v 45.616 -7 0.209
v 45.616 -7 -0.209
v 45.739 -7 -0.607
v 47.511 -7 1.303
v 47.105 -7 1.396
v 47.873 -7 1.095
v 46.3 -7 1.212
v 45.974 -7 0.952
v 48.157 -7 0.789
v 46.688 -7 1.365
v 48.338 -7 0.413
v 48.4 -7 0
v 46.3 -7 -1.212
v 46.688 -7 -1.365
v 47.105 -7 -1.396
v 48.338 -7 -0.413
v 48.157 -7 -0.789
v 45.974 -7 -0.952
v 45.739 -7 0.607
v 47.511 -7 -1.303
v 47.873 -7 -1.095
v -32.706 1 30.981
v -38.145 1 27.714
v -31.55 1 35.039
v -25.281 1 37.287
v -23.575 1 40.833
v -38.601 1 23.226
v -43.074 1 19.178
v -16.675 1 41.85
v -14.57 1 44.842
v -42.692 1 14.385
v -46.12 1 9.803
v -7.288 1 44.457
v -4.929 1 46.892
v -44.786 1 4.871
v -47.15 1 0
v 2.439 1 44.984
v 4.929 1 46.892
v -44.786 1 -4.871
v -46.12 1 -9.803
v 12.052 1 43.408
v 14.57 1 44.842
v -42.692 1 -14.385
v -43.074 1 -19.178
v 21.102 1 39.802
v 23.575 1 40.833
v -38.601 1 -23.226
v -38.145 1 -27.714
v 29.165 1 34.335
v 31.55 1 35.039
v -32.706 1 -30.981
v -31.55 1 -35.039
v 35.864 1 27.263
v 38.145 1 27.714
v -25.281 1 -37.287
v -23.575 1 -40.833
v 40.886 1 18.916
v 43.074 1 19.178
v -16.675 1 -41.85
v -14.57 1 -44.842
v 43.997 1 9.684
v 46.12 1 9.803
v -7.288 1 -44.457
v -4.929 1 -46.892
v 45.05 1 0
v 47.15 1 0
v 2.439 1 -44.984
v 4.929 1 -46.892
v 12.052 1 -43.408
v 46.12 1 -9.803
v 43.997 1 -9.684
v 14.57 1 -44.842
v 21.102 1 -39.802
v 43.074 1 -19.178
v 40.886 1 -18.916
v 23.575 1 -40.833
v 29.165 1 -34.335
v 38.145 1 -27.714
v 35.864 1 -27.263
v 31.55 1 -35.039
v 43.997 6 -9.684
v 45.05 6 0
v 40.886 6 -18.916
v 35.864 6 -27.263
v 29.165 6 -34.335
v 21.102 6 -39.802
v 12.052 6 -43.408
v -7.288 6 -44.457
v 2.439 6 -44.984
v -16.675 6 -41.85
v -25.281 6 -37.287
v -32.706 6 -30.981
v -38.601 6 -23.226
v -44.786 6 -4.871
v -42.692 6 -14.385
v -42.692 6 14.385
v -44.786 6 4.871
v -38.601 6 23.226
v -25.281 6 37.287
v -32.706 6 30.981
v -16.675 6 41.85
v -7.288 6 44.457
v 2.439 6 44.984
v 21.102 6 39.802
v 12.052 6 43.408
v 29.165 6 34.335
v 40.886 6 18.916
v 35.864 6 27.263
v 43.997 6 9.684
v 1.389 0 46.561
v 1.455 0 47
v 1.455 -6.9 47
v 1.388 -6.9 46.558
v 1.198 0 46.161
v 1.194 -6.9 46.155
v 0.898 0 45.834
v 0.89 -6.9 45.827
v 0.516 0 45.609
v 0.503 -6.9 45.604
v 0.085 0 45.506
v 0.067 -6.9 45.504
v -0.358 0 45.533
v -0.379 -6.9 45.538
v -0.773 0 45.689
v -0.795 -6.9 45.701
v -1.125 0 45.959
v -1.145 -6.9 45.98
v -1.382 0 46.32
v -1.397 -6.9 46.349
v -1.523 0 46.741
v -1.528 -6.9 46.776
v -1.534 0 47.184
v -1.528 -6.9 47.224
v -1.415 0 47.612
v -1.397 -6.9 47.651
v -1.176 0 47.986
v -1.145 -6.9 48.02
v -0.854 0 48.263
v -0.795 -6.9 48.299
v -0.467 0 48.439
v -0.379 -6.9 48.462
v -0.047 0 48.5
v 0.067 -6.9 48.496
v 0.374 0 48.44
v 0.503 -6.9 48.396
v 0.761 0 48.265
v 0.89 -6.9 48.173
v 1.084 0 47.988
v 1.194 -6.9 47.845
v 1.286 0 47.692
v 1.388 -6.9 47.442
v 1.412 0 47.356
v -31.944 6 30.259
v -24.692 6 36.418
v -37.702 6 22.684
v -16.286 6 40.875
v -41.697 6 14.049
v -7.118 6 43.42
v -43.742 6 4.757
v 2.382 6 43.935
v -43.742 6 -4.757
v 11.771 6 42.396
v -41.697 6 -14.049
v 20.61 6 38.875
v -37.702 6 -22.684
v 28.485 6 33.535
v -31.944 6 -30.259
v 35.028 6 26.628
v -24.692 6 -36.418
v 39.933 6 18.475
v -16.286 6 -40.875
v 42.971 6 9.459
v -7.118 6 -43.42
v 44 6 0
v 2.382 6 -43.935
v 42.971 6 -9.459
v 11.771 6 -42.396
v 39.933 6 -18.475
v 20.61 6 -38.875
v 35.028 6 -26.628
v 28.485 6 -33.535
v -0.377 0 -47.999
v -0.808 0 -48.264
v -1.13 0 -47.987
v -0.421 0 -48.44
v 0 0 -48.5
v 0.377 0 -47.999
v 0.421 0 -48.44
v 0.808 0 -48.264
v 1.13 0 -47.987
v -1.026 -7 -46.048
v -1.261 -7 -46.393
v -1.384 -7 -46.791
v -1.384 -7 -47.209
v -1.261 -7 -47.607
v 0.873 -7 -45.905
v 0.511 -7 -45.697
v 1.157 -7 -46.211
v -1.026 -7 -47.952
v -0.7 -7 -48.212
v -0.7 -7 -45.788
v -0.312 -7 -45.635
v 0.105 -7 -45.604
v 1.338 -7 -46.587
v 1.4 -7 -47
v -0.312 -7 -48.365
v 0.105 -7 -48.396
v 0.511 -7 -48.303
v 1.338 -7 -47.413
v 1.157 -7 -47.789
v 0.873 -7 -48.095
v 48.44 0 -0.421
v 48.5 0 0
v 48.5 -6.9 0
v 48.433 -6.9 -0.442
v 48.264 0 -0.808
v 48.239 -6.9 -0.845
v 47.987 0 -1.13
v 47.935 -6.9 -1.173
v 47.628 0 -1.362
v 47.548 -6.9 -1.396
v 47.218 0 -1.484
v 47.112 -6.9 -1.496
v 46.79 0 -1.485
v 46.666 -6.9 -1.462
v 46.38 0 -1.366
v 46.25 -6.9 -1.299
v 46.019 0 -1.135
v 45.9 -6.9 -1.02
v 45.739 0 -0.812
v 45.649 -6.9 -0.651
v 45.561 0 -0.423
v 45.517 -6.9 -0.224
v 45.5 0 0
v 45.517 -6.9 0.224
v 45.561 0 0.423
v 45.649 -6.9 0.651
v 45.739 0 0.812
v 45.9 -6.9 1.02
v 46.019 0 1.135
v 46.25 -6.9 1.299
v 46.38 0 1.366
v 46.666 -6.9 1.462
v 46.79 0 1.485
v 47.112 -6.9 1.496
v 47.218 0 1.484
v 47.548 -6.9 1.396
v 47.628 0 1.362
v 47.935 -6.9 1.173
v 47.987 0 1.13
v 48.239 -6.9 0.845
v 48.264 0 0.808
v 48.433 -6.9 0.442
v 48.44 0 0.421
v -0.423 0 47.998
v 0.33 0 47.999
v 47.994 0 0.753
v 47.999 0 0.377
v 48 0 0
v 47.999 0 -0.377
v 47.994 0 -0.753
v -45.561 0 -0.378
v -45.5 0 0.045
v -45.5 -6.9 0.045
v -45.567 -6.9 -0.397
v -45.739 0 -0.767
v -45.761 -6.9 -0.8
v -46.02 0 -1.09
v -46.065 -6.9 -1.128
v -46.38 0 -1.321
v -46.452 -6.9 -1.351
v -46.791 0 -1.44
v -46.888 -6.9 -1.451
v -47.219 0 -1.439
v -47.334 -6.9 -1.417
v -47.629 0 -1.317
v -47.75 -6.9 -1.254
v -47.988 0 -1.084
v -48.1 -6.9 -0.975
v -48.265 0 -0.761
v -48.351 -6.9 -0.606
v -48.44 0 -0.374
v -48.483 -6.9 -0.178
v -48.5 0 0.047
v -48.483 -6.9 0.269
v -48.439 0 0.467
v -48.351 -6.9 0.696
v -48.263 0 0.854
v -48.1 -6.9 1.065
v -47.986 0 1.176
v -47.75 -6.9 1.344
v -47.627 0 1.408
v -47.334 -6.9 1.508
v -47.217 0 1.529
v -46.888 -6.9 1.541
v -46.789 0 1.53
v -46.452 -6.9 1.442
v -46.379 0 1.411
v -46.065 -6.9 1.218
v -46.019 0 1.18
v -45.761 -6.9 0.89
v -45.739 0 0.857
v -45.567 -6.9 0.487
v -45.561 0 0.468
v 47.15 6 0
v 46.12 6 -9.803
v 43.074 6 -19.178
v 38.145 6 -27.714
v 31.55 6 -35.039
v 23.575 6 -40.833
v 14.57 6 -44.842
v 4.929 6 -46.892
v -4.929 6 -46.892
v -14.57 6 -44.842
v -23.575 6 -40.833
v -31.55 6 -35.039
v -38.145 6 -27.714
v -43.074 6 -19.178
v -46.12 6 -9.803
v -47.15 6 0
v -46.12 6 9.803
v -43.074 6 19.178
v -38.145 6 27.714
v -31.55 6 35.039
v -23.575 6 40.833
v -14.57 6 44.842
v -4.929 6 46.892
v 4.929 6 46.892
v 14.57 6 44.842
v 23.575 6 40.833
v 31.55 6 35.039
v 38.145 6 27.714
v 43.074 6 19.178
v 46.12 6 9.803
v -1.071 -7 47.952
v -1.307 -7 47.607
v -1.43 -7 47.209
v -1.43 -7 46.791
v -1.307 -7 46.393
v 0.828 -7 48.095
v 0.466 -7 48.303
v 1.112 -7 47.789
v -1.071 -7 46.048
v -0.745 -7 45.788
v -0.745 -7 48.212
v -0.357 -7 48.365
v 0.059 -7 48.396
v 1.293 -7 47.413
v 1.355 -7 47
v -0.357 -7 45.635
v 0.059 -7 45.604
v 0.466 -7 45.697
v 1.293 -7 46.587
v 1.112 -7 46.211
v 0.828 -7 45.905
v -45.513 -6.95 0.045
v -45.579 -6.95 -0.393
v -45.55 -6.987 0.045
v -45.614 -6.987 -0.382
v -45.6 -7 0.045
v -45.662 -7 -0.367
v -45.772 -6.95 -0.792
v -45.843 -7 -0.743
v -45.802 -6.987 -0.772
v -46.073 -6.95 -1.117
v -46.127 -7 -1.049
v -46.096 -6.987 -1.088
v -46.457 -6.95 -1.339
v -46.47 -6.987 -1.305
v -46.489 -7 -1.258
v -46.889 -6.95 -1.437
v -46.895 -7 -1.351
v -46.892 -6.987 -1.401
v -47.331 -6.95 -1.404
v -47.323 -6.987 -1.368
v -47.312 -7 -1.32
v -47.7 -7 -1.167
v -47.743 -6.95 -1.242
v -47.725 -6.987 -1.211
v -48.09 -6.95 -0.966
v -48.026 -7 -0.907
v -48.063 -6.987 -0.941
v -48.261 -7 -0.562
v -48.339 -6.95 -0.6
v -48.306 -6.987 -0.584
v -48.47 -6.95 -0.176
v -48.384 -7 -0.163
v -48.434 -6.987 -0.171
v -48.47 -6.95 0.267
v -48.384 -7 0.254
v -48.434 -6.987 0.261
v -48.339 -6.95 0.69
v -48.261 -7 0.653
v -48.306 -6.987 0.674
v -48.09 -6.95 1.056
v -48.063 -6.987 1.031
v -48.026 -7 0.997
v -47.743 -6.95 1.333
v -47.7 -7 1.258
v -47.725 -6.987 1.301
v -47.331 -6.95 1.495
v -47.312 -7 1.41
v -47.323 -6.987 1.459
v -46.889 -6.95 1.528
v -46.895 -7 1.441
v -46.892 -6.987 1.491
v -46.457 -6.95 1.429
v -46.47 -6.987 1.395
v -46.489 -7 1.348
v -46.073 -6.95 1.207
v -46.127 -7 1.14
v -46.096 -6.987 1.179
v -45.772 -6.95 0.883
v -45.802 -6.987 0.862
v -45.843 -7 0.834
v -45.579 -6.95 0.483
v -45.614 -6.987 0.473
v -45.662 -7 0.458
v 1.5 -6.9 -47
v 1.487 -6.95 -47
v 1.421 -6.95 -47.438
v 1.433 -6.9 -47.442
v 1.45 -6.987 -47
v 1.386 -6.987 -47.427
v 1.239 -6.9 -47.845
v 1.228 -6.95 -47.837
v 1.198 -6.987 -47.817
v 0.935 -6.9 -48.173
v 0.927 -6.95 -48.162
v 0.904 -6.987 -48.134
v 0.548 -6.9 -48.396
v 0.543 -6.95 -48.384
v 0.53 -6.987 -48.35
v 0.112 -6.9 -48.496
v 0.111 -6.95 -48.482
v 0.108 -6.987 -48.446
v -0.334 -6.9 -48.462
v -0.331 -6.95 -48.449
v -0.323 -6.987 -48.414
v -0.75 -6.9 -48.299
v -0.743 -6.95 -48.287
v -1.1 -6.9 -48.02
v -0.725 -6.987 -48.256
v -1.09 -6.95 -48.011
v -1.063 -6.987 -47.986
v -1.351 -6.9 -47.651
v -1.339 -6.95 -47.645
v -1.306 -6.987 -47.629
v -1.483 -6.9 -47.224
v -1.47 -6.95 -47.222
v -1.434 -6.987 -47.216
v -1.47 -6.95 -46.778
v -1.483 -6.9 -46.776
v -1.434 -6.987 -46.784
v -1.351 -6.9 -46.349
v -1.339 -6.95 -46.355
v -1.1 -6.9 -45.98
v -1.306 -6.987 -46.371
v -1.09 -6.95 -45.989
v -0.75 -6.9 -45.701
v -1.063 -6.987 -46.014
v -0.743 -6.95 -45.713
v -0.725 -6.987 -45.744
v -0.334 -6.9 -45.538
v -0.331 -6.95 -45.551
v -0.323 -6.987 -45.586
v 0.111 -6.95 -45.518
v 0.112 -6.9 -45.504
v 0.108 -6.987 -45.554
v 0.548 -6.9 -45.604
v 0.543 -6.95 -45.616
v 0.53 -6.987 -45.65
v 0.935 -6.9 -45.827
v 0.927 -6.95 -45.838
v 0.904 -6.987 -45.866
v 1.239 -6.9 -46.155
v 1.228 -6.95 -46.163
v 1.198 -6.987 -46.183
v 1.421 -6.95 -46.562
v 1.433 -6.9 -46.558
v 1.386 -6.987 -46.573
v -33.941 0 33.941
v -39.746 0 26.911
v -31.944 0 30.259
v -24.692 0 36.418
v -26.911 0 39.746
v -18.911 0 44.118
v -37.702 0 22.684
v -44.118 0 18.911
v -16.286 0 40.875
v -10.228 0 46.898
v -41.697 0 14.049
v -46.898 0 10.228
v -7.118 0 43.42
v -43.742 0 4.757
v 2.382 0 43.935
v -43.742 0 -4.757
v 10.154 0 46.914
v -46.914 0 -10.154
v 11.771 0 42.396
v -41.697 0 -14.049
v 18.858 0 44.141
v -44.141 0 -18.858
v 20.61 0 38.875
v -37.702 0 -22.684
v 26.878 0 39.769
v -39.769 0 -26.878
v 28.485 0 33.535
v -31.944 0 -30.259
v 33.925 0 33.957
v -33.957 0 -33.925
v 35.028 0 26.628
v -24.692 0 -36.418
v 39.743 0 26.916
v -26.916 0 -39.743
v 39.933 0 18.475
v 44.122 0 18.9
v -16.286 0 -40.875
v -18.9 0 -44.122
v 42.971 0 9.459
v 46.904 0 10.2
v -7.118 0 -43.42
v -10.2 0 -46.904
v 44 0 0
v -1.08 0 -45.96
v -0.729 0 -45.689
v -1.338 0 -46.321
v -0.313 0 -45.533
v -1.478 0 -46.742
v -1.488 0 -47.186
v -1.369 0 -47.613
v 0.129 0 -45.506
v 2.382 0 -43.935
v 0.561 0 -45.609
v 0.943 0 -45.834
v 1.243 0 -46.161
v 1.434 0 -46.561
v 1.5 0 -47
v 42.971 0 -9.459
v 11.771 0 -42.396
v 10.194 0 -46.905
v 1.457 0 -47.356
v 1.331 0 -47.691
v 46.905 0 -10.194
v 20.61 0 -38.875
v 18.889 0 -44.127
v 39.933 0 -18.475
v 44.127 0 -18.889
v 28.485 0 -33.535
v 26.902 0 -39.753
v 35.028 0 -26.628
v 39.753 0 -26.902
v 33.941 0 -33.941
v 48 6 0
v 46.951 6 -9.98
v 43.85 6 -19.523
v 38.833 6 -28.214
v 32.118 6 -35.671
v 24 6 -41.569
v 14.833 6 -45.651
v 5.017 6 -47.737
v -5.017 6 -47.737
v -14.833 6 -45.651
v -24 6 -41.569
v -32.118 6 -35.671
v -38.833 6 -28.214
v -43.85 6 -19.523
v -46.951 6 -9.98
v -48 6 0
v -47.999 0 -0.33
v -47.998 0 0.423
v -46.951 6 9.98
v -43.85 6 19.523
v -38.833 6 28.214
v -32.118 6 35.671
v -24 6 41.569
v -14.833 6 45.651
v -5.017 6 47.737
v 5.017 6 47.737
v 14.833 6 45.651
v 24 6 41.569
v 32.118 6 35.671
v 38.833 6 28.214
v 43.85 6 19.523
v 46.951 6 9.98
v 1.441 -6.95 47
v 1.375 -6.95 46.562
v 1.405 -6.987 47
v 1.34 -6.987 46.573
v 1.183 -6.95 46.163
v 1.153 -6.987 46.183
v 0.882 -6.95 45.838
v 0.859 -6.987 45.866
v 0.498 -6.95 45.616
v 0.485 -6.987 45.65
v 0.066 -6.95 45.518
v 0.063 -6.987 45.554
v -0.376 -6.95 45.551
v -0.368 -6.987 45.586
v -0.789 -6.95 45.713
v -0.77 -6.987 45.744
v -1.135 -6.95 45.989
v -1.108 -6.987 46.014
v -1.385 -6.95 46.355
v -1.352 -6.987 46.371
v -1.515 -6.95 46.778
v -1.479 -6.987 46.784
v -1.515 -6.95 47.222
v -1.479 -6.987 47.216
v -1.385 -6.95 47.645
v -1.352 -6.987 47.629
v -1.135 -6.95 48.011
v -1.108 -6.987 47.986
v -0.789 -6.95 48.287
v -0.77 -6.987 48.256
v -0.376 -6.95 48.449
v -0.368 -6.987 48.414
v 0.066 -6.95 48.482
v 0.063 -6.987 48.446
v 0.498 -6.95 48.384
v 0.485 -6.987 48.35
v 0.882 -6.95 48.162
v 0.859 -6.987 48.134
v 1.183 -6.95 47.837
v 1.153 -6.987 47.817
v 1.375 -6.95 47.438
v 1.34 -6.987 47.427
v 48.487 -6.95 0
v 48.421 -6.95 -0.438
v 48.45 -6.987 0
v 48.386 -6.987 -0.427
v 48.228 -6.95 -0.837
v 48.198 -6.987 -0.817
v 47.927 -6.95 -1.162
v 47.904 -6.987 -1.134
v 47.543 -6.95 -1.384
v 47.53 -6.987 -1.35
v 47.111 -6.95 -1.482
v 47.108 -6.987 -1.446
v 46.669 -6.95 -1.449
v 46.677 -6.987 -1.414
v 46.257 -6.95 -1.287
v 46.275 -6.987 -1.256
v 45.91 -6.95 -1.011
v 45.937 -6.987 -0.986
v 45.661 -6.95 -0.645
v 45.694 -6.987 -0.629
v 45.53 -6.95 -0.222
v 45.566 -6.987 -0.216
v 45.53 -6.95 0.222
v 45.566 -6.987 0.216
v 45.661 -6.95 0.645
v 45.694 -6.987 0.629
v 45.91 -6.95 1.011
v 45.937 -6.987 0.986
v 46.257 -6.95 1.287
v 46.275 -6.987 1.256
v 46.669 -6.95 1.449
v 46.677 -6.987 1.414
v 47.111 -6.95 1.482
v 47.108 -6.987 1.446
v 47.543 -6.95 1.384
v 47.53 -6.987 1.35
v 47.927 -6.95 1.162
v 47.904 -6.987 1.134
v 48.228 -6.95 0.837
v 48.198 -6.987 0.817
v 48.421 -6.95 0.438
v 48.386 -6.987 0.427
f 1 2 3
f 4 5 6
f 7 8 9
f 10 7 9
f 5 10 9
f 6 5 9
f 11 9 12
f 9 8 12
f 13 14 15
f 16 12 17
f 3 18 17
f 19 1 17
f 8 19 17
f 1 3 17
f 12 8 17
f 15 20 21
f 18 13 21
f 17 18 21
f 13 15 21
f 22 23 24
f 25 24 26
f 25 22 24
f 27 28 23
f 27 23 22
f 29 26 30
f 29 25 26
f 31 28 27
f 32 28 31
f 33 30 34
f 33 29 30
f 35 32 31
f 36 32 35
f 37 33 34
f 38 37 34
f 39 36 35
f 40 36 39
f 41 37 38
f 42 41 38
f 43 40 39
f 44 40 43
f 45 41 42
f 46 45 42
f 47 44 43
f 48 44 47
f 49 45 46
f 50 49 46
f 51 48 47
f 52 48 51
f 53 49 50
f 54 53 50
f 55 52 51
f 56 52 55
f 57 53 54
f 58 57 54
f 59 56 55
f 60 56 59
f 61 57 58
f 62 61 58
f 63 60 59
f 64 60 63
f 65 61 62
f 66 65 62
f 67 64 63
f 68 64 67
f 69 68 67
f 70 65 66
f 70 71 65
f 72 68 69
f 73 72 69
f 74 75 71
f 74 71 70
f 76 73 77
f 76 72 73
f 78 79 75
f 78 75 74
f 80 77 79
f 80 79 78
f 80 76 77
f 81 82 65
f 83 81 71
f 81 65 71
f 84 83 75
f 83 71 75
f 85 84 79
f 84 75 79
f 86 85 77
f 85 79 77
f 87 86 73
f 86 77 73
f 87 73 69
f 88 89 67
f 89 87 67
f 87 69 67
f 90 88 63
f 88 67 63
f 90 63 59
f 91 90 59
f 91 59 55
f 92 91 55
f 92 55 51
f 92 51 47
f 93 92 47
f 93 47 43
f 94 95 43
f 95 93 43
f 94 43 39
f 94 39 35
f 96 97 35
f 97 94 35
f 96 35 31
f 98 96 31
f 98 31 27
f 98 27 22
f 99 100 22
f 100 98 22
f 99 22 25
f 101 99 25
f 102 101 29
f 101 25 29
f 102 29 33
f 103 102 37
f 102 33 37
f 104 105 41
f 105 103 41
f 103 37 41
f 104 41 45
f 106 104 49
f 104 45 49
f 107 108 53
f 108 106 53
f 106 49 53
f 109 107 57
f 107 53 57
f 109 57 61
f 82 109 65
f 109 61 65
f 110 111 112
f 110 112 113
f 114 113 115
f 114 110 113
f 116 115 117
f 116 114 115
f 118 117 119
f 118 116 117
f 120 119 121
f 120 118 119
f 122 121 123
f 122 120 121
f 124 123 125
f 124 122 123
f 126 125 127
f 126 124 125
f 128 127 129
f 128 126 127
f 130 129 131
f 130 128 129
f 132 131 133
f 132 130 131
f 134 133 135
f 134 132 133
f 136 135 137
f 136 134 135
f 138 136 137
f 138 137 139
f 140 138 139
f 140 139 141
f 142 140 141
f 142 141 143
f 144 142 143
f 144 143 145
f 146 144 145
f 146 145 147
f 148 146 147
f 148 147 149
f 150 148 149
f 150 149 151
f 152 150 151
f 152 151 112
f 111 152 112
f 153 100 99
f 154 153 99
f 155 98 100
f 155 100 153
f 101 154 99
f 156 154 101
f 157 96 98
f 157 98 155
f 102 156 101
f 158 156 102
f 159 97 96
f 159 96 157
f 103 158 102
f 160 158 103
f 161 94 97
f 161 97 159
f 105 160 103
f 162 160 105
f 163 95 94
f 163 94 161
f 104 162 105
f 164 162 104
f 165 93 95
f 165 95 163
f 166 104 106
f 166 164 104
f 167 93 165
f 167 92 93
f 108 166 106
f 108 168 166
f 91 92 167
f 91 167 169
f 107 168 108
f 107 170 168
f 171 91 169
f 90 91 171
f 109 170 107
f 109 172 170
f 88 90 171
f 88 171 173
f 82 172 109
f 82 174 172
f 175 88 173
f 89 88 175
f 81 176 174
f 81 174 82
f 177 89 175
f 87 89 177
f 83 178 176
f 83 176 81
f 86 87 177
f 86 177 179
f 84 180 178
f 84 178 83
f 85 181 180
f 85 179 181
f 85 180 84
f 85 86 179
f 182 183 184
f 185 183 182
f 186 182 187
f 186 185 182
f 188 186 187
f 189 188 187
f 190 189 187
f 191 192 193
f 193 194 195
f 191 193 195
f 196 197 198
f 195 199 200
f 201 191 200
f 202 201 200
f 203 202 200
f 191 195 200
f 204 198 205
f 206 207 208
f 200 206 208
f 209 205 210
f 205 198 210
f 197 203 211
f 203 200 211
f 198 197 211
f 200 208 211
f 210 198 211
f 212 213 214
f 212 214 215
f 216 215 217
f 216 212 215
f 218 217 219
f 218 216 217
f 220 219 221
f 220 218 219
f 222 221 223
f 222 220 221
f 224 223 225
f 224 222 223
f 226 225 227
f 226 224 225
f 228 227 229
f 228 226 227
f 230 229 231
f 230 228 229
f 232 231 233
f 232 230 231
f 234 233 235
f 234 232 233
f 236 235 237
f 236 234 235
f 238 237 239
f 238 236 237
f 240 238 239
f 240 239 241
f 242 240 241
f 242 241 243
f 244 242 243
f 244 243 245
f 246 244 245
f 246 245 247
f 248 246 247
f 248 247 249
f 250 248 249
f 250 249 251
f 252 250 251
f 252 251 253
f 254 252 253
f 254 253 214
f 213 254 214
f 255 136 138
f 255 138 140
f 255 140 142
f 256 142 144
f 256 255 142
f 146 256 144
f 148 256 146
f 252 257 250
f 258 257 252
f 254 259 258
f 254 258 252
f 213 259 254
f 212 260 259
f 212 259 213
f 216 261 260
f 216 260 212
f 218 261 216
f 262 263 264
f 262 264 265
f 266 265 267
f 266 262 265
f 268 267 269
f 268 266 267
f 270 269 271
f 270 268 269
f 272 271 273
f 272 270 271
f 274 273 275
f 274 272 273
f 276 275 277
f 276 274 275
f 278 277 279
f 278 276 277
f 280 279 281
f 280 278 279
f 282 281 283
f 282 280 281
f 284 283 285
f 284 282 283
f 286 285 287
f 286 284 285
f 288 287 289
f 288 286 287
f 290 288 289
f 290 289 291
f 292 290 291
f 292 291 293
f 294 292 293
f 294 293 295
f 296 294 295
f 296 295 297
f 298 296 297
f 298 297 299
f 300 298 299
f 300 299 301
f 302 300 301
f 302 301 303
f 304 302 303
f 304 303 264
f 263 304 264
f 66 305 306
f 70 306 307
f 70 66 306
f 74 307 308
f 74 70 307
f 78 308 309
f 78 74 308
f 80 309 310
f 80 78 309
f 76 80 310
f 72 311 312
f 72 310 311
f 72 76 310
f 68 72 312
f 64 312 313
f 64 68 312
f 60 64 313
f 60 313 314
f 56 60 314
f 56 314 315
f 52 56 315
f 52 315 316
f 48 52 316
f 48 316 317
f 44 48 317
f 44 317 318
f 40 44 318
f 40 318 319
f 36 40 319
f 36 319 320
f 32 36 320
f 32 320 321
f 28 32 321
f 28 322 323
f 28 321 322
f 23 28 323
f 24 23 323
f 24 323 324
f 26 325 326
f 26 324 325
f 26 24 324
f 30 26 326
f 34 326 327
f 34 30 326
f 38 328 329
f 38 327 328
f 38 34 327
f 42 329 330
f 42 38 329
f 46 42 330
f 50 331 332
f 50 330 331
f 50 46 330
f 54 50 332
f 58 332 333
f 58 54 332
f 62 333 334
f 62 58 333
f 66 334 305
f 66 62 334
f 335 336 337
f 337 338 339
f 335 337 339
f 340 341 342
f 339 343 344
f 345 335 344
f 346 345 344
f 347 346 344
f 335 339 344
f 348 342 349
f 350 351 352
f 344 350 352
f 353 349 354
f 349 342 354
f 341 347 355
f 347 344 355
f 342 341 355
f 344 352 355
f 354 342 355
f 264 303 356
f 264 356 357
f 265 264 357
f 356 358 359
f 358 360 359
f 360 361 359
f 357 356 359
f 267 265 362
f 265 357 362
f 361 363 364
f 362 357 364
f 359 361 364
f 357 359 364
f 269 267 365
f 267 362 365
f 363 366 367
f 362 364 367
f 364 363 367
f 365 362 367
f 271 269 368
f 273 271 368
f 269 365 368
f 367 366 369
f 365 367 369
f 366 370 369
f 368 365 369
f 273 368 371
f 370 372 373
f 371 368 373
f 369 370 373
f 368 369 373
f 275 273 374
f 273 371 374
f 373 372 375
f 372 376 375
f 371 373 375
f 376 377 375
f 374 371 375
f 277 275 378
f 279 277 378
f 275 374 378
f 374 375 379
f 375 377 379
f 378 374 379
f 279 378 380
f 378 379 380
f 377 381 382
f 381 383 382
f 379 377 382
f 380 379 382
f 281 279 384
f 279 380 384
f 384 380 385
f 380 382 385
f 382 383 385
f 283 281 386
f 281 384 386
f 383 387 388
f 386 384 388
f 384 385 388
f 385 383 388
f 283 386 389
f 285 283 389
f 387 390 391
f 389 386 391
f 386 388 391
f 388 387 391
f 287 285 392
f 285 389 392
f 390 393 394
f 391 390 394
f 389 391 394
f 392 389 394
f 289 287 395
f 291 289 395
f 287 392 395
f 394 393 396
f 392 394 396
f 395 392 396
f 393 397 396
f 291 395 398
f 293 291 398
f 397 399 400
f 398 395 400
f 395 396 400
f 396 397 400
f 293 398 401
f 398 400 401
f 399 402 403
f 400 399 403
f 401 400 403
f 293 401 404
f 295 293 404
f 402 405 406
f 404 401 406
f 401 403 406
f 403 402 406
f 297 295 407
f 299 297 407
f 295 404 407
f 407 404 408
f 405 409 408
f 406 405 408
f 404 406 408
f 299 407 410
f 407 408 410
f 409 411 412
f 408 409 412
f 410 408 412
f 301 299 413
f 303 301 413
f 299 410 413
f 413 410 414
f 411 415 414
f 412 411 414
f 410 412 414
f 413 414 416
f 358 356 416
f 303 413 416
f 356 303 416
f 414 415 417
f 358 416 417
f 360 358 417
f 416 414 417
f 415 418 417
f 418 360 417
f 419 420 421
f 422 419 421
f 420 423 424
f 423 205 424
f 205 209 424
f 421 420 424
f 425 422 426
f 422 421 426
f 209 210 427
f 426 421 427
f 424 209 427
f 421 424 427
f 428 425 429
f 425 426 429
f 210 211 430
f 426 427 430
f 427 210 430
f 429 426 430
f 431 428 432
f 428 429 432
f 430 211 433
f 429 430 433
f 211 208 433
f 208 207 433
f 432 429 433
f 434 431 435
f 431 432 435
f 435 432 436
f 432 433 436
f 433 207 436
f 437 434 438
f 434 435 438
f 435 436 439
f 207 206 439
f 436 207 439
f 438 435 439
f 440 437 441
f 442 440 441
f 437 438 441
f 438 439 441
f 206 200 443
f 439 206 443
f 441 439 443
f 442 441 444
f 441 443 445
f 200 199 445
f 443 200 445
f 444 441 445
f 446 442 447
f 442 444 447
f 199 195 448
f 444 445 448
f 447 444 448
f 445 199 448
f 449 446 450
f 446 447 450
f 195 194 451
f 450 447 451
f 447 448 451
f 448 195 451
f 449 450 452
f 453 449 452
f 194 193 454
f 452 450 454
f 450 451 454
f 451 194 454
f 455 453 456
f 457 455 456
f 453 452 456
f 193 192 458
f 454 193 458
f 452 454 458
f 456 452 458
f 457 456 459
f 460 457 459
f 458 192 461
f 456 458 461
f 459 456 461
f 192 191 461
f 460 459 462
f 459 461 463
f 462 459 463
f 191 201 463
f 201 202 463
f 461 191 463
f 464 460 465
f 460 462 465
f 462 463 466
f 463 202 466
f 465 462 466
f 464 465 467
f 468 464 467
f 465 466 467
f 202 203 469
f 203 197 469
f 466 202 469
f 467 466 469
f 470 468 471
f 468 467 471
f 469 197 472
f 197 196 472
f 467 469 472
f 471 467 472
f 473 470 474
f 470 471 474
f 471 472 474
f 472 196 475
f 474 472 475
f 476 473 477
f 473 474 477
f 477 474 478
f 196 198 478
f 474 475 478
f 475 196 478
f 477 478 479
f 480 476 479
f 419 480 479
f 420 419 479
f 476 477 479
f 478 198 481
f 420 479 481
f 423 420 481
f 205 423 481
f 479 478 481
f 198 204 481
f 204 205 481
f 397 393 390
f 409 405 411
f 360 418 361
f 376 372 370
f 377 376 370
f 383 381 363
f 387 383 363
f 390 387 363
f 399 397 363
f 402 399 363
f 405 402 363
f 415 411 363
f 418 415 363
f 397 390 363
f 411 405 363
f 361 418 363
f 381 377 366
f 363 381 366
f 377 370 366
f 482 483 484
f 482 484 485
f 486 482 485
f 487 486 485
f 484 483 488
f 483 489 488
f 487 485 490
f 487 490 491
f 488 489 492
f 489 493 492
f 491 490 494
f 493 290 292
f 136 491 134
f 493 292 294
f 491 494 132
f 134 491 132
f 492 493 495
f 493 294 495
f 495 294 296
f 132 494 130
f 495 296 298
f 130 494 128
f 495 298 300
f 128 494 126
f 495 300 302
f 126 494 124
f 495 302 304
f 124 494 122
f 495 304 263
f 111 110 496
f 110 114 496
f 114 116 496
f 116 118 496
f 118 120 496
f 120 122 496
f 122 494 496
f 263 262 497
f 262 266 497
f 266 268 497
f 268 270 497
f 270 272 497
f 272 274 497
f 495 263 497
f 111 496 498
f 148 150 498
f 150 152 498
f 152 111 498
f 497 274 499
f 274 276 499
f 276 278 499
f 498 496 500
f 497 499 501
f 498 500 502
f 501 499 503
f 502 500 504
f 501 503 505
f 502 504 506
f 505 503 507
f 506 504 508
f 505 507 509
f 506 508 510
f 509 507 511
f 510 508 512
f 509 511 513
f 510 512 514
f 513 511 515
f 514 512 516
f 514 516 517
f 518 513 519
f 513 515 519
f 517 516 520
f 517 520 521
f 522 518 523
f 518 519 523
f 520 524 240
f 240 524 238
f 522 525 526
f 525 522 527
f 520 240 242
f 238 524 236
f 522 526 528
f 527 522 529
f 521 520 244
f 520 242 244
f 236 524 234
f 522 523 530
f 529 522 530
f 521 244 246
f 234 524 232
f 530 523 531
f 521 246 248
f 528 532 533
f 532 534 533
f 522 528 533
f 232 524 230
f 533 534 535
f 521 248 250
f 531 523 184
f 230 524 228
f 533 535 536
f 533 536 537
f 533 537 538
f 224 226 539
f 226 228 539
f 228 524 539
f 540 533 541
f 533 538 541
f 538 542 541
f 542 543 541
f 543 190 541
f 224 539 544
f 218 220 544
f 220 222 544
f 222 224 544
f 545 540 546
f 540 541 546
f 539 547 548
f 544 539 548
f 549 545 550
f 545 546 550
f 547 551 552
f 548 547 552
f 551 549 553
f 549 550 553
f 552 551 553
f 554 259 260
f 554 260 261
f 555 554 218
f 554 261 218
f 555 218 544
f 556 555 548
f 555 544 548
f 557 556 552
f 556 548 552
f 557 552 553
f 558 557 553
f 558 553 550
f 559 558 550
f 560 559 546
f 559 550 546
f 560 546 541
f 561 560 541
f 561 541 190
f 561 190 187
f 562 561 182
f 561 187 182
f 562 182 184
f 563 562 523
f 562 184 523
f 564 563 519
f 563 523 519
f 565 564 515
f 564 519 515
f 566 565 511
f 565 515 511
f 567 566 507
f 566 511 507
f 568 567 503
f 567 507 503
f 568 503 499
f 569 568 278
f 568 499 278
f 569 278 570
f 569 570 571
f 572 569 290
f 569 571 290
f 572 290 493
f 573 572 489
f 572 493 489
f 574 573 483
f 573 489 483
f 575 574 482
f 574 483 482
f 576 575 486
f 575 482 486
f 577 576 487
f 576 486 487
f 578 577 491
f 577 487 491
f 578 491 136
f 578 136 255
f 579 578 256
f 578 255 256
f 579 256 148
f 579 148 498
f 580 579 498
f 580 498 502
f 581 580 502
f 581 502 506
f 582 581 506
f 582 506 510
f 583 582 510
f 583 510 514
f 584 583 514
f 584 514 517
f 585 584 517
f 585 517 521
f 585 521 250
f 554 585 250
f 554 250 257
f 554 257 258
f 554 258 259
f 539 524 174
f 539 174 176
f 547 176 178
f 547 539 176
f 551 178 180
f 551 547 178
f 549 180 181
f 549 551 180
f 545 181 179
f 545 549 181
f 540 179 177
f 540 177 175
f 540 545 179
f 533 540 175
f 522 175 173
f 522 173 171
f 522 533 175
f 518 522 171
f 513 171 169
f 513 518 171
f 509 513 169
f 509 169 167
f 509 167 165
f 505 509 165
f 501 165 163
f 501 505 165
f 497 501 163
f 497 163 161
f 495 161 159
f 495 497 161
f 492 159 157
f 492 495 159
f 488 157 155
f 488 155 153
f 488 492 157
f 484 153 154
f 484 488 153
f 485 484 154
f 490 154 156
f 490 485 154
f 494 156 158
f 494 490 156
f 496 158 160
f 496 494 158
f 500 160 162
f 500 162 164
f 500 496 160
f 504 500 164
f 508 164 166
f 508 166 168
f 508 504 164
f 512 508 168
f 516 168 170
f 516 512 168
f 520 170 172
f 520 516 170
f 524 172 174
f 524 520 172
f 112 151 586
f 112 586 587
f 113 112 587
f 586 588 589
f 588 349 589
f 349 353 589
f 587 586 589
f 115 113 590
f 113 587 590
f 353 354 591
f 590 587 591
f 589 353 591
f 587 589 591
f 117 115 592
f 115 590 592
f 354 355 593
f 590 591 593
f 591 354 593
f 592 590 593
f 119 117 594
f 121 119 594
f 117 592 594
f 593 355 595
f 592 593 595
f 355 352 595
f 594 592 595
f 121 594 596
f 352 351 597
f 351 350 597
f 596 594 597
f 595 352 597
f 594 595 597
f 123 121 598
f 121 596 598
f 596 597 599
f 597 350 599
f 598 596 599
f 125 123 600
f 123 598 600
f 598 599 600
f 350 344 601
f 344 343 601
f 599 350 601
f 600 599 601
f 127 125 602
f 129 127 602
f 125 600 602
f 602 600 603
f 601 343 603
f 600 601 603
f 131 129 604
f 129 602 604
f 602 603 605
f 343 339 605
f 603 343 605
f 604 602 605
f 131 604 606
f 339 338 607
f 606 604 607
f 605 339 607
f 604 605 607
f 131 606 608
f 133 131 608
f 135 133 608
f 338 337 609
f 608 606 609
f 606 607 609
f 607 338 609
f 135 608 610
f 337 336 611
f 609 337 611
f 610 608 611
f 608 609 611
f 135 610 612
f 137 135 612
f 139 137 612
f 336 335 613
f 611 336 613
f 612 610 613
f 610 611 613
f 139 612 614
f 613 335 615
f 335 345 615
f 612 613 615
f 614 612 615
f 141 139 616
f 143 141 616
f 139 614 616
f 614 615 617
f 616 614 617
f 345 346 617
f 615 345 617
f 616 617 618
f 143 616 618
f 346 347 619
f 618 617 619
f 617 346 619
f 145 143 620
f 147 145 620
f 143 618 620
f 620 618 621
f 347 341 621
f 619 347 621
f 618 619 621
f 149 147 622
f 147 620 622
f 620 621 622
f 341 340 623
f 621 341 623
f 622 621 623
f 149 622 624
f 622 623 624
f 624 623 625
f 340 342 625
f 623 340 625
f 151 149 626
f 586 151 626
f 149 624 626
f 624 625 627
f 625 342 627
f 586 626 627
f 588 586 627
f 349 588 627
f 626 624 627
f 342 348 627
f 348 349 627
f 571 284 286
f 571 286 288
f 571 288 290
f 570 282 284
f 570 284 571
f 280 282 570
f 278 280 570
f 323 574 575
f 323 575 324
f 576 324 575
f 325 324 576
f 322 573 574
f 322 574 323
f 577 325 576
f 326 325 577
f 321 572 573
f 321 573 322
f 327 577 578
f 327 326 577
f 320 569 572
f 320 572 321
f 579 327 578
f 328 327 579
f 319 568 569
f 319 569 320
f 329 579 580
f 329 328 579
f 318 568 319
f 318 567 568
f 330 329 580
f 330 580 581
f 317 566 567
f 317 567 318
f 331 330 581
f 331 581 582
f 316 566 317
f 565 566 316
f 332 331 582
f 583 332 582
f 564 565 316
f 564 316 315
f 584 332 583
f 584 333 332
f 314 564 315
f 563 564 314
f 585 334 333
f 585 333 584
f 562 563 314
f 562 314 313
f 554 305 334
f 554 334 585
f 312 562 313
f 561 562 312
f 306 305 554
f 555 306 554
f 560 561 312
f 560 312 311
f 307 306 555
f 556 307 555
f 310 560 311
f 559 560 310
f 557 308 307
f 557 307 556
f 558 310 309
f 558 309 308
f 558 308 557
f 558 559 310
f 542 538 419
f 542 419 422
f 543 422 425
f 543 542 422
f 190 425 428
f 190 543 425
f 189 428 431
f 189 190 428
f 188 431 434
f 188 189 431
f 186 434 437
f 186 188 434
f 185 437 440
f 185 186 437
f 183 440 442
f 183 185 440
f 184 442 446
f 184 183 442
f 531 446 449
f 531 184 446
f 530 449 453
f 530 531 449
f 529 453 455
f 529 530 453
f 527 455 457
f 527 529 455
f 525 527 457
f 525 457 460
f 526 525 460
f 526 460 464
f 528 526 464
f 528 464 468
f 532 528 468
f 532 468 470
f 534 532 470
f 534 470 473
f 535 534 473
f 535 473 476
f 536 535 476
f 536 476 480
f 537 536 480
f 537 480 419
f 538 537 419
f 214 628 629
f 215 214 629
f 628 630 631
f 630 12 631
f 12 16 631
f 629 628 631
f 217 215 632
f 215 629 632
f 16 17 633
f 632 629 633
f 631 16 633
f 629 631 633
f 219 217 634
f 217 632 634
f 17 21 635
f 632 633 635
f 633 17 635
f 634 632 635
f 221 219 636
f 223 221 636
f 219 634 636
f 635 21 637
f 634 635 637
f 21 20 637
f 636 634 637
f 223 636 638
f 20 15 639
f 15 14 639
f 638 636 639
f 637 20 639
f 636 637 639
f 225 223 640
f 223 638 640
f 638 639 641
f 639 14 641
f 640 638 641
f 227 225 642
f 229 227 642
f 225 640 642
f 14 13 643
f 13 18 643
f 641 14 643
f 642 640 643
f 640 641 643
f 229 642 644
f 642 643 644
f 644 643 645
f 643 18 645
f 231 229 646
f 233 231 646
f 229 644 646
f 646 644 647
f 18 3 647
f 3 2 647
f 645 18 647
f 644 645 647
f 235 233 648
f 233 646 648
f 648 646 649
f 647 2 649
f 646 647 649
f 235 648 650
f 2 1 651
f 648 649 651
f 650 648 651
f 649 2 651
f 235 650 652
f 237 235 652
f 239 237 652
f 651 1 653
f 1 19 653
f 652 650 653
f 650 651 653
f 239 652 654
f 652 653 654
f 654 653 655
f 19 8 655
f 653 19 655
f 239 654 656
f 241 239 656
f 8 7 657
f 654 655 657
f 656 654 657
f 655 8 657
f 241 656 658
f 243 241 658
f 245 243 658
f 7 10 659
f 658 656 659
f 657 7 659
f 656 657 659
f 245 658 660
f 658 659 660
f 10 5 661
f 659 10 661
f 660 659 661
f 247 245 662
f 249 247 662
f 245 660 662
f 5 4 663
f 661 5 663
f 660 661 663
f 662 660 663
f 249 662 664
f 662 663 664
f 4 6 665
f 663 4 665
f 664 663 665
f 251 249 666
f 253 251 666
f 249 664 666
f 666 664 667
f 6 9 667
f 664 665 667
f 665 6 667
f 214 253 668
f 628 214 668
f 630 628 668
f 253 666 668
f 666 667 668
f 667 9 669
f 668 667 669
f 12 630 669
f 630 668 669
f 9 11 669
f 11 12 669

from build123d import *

# Parameters (mm, degrees)
SKETCH1_R           = 48
SKETCH1_R_2         = 44
BOSS_EXTRUDE1_DEPTH = 6
CUT_EXTRUDE3_START  = 1
SKETCH2_R           = 47.15
SKETCH2_R_2         = 45.05
CUT_EXTRUDE3_DEPTH  = 10
SKETCH3_R           = 1.5
BOSS_EXTRUDE2_DEPTH = 7
FILLET1_R           = 0.1


with BuildPart() as part:
    # Sketch1 → Boss-Extrude1 (new body)
    with BuildSketch(Plane(origin=(0, 0, 0), x_dir=(1, 0, 0), z_dir=(0, 1, 0))):
        Circle(SKETCH1_R)
        Circle(SKETCH1_R_2, mode=Mode.SUBTRACT)
    extrude(amount=BOSS_EXTRUDE1_DEPTH)

    # Sketch2 → Cut-Extrude3 (cut)
    with BuildSketch(Plane(origin=(0, 0, 0), x_dir=(1, 0, 0), z_dir=(0, 1, 0)).offset(CUT_EXTRUDE3_START)):
        Circle(SKETCH2_R)
        Circle(SKETCH2_R_2, mode=Mode.SUBTRACT)
    extrude(amount=CUT_EXTRUDE3_DEPTH, mode=Mode.SUBTRACT)

    # Sketch3 → Boss-Extrude2 (add)
    with BuildSketch(Plane(origin=(0, 0, 0), x_dir=(1, 0, 0), z_dir=(0, 1, 0))):
        with Locations((0, 47)):
            Circle(SKETCH3_R)
        with Locations((47, 0)):
            Circle(SKETCH3_R)
        with Locations((-0.045212766, -46.999978253)):
            Circle(SKETCH3_R)
        with Locations((-46.999978253, -0.045212766)):
            Circle(SKETCH3_R)
    extrude(amount=-BOSS_EXTRUDE2_DEPTH)

    # Fillet1
    fillet1_edges = [part.edges().sort_by_distance(p)[0] for p in [
        (-1.5, -7, -47),
        (45.5, -7, 0),
        (-1.545212766, -7, 46.999978253),
        (-48.499978253, -7, 0.045212766),
    ]]
    fillet(fillet1_edges, radius=FILLET1_R)


solid = part.part
